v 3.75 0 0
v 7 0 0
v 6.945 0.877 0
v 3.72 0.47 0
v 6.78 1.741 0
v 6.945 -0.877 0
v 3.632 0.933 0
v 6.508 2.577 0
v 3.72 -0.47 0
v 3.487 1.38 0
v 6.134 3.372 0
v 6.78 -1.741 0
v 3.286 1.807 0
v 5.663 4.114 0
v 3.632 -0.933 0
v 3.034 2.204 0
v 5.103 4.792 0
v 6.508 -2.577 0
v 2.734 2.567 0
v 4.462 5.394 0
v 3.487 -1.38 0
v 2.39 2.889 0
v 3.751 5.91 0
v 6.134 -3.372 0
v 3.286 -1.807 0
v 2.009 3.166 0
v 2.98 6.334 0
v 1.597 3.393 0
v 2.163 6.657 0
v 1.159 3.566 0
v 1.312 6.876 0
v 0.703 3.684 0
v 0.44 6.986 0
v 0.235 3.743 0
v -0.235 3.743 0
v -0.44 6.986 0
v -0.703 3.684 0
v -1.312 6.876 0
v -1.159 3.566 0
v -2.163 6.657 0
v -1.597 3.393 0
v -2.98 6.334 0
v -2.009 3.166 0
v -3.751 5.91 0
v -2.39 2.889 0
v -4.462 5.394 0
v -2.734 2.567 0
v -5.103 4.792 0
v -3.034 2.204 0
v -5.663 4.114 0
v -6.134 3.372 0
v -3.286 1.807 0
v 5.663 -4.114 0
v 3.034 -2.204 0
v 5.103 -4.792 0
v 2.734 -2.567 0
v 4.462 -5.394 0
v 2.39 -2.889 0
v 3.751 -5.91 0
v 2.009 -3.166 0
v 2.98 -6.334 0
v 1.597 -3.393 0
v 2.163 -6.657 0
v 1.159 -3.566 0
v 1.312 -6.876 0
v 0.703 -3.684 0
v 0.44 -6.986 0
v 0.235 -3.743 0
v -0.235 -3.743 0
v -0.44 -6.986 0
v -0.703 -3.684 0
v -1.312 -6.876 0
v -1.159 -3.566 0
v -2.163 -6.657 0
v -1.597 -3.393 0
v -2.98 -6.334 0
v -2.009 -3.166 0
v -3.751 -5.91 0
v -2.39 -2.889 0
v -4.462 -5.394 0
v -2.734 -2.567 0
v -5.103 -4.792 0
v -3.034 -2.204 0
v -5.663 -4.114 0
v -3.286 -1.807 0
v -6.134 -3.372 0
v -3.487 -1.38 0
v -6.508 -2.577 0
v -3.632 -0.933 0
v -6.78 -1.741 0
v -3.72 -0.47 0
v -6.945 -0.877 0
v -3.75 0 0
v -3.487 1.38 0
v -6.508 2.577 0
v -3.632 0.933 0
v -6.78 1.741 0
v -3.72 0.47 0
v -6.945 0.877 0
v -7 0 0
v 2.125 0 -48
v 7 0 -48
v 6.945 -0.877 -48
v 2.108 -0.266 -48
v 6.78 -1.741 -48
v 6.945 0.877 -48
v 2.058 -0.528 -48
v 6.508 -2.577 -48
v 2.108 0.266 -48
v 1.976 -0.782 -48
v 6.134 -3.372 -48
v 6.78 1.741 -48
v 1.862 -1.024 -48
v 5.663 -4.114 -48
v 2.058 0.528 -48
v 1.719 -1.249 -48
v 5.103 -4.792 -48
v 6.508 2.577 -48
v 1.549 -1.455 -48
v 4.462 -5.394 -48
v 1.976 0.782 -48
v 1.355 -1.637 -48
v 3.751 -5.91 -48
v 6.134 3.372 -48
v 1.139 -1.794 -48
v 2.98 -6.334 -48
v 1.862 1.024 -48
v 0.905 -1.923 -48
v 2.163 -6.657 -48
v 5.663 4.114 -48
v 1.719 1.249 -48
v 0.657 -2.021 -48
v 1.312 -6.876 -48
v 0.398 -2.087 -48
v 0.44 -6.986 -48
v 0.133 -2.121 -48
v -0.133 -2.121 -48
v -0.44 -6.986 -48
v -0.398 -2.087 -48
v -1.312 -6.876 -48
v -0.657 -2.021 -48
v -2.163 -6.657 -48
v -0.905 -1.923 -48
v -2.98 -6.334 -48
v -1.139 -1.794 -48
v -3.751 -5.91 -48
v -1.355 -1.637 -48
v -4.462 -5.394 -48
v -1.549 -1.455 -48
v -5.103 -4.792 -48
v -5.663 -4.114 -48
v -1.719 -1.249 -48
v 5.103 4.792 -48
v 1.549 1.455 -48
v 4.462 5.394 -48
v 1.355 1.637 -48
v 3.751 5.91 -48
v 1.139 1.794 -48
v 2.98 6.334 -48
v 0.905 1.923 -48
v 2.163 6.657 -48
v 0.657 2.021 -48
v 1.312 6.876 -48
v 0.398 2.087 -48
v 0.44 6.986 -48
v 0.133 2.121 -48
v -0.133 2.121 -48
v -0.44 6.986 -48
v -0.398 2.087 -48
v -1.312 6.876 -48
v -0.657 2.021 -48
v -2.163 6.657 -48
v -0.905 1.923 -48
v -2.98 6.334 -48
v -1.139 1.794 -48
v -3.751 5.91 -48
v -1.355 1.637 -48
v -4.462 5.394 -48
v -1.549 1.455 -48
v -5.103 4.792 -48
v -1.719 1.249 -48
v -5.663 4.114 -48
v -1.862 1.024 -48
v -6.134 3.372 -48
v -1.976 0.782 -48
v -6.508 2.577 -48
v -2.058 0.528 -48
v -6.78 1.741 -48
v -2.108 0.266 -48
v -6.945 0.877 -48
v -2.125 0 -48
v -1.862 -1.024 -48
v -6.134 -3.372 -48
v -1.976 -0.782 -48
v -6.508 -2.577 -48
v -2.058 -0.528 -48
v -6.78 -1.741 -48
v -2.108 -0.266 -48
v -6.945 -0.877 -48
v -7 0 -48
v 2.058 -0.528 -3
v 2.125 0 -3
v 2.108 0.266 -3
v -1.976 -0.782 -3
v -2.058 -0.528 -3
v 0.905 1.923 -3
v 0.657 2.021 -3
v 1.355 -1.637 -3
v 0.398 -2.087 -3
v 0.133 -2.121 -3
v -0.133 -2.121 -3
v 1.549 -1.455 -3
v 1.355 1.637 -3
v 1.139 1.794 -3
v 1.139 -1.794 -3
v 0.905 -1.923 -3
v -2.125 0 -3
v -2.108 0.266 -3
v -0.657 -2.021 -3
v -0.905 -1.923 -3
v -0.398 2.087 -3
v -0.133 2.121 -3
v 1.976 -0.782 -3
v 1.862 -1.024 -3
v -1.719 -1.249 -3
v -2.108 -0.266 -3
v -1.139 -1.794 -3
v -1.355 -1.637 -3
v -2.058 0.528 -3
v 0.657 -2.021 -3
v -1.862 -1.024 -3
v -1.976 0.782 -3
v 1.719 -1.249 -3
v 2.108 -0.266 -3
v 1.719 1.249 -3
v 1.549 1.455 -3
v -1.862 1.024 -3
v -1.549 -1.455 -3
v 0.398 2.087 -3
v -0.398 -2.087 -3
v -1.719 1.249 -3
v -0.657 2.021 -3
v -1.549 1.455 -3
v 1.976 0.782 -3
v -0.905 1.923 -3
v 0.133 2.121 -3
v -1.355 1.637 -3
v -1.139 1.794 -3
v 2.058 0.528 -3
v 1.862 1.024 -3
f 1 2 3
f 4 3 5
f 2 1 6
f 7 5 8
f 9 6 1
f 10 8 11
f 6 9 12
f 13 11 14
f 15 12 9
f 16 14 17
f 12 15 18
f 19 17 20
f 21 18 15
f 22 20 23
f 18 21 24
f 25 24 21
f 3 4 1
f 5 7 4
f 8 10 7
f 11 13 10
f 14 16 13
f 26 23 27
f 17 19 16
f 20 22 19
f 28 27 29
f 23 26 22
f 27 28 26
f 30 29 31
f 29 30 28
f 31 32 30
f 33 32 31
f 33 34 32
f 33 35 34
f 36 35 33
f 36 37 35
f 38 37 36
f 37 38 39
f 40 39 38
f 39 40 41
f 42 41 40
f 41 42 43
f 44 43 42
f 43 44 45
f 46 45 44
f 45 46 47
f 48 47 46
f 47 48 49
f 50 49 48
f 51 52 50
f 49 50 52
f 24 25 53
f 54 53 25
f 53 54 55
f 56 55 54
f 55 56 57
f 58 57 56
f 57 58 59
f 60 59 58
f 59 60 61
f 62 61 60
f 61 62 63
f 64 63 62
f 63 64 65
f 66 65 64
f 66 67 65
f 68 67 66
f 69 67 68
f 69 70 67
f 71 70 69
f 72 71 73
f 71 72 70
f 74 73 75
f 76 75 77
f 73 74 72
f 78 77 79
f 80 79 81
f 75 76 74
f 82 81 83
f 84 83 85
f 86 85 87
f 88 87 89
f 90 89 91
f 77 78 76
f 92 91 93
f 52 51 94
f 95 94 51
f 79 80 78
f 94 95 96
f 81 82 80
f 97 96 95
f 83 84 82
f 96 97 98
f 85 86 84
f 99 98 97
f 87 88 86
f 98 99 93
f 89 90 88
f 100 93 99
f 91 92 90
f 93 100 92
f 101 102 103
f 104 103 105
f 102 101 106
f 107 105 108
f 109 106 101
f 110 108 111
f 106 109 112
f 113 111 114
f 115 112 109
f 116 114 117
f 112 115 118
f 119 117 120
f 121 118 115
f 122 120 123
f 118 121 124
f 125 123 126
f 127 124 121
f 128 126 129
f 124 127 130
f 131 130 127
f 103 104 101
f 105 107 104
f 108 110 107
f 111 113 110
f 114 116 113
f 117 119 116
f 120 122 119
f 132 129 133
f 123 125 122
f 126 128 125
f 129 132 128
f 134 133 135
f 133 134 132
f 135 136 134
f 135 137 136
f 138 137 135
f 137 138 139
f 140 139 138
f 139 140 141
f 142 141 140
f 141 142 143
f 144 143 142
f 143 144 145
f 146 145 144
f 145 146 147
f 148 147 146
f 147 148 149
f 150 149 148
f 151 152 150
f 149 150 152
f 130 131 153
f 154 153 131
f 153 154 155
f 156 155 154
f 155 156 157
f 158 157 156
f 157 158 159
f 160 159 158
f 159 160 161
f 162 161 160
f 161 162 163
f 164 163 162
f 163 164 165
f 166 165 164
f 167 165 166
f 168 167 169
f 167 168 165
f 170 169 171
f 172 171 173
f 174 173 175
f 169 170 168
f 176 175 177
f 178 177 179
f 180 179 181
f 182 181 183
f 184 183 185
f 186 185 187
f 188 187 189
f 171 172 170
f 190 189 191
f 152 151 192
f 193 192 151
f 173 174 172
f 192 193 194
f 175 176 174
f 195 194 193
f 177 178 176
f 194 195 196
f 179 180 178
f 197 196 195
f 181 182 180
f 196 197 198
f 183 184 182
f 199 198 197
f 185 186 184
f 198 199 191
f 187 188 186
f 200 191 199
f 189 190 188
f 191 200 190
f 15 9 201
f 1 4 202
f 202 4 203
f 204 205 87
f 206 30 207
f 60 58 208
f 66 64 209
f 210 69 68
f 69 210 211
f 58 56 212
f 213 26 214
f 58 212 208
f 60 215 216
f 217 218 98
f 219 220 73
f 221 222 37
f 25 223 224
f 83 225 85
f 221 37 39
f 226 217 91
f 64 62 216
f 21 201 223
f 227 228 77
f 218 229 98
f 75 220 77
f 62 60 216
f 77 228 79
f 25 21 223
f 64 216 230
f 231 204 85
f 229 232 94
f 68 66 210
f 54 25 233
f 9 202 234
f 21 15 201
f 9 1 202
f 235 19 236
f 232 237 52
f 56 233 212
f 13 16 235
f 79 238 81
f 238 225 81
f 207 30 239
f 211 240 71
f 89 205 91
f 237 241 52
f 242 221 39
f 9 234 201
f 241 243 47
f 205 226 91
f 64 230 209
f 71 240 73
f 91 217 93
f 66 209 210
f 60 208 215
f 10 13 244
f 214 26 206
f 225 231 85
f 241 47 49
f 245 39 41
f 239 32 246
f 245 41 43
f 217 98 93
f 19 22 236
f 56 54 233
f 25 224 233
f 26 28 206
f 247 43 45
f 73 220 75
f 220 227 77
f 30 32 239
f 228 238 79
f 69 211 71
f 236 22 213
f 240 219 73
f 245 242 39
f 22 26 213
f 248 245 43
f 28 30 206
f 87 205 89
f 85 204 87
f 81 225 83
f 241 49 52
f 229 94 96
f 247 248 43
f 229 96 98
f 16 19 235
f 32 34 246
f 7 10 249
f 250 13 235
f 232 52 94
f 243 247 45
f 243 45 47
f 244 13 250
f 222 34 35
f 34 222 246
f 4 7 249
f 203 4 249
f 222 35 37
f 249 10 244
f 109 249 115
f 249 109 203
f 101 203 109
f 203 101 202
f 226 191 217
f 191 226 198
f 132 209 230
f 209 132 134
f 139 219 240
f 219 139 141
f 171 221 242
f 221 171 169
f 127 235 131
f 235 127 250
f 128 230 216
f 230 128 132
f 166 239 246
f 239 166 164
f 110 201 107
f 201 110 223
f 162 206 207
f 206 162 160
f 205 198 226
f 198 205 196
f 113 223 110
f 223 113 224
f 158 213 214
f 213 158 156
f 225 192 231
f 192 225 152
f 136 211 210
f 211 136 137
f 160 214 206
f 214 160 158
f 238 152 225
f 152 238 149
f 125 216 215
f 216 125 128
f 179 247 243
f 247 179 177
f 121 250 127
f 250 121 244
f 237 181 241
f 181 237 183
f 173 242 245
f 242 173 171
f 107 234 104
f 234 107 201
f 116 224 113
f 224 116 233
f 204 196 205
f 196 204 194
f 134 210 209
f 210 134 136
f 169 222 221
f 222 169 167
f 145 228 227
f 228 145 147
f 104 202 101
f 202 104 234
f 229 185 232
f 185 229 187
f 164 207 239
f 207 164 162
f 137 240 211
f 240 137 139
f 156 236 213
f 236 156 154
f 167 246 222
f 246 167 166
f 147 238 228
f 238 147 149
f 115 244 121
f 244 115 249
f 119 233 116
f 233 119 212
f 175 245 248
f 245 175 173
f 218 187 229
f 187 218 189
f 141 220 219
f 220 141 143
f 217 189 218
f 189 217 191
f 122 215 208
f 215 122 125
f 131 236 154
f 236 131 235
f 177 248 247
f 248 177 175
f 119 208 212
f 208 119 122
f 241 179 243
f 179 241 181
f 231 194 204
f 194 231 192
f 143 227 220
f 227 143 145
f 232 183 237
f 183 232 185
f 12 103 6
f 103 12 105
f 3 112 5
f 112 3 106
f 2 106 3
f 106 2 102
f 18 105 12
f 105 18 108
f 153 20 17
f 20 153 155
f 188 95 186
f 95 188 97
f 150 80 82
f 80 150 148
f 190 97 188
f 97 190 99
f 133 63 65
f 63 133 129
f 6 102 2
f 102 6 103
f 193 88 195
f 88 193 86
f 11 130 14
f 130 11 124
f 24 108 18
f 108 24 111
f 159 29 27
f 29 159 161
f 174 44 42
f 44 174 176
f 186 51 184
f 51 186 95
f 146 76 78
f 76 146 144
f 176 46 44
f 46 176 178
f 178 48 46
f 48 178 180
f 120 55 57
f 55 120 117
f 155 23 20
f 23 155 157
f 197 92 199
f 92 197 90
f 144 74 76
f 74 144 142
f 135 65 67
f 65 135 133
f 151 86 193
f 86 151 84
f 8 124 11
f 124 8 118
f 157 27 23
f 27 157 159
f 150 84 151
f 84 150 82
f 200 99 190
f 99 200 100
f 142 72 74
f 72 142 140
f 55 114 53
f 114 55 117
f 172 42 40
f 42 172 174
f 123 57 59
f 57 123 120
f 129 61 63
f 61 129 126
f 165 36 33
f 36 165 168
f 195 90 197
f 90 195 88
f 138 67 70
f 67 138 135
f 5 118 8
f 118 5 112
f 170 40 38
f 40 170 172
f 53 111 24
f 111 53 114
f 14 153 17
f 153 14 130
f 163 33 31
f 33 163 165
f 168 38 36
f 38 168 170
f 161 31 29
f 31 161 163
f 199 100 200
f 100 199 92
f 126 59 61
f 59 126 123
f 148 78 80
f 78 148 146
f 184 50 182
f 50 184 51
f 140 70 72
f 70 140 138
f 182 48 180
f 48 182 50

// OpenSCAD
$fn = 50;


difference() {
	union() {
		translate(v = [0, 0, -48.0000000000]) {
			cylinder(h = 48, r = 7.0000000000);
		}
	}
	union() {
		translate(v = [0, 0, 0]) {
			rotate(a = [0, 0, 0]) {
				difference() {
					union() {
						#translate(v = [0, 0, -48.0000000000]) {
							cylinder(h = 48, r = 2.0000000000);
						}
						#translate(v = [0, 0, -3]) {
							cylinder(h = 3, r = 7.0000000000, r1 = 2.1250000000, r2 = 3.7500000000);
						}
						#translate(v = [0, 0, -48.0000000000]) {
							cylinder(h = 48, r = 2.1250000000);
						}
						#translate(v = [0, 0, -48.0000000000]) {
							cylinder(h = 48, r = 2.0000000000);
						}
					}
					union();
				}
			}
		}
	}
}
